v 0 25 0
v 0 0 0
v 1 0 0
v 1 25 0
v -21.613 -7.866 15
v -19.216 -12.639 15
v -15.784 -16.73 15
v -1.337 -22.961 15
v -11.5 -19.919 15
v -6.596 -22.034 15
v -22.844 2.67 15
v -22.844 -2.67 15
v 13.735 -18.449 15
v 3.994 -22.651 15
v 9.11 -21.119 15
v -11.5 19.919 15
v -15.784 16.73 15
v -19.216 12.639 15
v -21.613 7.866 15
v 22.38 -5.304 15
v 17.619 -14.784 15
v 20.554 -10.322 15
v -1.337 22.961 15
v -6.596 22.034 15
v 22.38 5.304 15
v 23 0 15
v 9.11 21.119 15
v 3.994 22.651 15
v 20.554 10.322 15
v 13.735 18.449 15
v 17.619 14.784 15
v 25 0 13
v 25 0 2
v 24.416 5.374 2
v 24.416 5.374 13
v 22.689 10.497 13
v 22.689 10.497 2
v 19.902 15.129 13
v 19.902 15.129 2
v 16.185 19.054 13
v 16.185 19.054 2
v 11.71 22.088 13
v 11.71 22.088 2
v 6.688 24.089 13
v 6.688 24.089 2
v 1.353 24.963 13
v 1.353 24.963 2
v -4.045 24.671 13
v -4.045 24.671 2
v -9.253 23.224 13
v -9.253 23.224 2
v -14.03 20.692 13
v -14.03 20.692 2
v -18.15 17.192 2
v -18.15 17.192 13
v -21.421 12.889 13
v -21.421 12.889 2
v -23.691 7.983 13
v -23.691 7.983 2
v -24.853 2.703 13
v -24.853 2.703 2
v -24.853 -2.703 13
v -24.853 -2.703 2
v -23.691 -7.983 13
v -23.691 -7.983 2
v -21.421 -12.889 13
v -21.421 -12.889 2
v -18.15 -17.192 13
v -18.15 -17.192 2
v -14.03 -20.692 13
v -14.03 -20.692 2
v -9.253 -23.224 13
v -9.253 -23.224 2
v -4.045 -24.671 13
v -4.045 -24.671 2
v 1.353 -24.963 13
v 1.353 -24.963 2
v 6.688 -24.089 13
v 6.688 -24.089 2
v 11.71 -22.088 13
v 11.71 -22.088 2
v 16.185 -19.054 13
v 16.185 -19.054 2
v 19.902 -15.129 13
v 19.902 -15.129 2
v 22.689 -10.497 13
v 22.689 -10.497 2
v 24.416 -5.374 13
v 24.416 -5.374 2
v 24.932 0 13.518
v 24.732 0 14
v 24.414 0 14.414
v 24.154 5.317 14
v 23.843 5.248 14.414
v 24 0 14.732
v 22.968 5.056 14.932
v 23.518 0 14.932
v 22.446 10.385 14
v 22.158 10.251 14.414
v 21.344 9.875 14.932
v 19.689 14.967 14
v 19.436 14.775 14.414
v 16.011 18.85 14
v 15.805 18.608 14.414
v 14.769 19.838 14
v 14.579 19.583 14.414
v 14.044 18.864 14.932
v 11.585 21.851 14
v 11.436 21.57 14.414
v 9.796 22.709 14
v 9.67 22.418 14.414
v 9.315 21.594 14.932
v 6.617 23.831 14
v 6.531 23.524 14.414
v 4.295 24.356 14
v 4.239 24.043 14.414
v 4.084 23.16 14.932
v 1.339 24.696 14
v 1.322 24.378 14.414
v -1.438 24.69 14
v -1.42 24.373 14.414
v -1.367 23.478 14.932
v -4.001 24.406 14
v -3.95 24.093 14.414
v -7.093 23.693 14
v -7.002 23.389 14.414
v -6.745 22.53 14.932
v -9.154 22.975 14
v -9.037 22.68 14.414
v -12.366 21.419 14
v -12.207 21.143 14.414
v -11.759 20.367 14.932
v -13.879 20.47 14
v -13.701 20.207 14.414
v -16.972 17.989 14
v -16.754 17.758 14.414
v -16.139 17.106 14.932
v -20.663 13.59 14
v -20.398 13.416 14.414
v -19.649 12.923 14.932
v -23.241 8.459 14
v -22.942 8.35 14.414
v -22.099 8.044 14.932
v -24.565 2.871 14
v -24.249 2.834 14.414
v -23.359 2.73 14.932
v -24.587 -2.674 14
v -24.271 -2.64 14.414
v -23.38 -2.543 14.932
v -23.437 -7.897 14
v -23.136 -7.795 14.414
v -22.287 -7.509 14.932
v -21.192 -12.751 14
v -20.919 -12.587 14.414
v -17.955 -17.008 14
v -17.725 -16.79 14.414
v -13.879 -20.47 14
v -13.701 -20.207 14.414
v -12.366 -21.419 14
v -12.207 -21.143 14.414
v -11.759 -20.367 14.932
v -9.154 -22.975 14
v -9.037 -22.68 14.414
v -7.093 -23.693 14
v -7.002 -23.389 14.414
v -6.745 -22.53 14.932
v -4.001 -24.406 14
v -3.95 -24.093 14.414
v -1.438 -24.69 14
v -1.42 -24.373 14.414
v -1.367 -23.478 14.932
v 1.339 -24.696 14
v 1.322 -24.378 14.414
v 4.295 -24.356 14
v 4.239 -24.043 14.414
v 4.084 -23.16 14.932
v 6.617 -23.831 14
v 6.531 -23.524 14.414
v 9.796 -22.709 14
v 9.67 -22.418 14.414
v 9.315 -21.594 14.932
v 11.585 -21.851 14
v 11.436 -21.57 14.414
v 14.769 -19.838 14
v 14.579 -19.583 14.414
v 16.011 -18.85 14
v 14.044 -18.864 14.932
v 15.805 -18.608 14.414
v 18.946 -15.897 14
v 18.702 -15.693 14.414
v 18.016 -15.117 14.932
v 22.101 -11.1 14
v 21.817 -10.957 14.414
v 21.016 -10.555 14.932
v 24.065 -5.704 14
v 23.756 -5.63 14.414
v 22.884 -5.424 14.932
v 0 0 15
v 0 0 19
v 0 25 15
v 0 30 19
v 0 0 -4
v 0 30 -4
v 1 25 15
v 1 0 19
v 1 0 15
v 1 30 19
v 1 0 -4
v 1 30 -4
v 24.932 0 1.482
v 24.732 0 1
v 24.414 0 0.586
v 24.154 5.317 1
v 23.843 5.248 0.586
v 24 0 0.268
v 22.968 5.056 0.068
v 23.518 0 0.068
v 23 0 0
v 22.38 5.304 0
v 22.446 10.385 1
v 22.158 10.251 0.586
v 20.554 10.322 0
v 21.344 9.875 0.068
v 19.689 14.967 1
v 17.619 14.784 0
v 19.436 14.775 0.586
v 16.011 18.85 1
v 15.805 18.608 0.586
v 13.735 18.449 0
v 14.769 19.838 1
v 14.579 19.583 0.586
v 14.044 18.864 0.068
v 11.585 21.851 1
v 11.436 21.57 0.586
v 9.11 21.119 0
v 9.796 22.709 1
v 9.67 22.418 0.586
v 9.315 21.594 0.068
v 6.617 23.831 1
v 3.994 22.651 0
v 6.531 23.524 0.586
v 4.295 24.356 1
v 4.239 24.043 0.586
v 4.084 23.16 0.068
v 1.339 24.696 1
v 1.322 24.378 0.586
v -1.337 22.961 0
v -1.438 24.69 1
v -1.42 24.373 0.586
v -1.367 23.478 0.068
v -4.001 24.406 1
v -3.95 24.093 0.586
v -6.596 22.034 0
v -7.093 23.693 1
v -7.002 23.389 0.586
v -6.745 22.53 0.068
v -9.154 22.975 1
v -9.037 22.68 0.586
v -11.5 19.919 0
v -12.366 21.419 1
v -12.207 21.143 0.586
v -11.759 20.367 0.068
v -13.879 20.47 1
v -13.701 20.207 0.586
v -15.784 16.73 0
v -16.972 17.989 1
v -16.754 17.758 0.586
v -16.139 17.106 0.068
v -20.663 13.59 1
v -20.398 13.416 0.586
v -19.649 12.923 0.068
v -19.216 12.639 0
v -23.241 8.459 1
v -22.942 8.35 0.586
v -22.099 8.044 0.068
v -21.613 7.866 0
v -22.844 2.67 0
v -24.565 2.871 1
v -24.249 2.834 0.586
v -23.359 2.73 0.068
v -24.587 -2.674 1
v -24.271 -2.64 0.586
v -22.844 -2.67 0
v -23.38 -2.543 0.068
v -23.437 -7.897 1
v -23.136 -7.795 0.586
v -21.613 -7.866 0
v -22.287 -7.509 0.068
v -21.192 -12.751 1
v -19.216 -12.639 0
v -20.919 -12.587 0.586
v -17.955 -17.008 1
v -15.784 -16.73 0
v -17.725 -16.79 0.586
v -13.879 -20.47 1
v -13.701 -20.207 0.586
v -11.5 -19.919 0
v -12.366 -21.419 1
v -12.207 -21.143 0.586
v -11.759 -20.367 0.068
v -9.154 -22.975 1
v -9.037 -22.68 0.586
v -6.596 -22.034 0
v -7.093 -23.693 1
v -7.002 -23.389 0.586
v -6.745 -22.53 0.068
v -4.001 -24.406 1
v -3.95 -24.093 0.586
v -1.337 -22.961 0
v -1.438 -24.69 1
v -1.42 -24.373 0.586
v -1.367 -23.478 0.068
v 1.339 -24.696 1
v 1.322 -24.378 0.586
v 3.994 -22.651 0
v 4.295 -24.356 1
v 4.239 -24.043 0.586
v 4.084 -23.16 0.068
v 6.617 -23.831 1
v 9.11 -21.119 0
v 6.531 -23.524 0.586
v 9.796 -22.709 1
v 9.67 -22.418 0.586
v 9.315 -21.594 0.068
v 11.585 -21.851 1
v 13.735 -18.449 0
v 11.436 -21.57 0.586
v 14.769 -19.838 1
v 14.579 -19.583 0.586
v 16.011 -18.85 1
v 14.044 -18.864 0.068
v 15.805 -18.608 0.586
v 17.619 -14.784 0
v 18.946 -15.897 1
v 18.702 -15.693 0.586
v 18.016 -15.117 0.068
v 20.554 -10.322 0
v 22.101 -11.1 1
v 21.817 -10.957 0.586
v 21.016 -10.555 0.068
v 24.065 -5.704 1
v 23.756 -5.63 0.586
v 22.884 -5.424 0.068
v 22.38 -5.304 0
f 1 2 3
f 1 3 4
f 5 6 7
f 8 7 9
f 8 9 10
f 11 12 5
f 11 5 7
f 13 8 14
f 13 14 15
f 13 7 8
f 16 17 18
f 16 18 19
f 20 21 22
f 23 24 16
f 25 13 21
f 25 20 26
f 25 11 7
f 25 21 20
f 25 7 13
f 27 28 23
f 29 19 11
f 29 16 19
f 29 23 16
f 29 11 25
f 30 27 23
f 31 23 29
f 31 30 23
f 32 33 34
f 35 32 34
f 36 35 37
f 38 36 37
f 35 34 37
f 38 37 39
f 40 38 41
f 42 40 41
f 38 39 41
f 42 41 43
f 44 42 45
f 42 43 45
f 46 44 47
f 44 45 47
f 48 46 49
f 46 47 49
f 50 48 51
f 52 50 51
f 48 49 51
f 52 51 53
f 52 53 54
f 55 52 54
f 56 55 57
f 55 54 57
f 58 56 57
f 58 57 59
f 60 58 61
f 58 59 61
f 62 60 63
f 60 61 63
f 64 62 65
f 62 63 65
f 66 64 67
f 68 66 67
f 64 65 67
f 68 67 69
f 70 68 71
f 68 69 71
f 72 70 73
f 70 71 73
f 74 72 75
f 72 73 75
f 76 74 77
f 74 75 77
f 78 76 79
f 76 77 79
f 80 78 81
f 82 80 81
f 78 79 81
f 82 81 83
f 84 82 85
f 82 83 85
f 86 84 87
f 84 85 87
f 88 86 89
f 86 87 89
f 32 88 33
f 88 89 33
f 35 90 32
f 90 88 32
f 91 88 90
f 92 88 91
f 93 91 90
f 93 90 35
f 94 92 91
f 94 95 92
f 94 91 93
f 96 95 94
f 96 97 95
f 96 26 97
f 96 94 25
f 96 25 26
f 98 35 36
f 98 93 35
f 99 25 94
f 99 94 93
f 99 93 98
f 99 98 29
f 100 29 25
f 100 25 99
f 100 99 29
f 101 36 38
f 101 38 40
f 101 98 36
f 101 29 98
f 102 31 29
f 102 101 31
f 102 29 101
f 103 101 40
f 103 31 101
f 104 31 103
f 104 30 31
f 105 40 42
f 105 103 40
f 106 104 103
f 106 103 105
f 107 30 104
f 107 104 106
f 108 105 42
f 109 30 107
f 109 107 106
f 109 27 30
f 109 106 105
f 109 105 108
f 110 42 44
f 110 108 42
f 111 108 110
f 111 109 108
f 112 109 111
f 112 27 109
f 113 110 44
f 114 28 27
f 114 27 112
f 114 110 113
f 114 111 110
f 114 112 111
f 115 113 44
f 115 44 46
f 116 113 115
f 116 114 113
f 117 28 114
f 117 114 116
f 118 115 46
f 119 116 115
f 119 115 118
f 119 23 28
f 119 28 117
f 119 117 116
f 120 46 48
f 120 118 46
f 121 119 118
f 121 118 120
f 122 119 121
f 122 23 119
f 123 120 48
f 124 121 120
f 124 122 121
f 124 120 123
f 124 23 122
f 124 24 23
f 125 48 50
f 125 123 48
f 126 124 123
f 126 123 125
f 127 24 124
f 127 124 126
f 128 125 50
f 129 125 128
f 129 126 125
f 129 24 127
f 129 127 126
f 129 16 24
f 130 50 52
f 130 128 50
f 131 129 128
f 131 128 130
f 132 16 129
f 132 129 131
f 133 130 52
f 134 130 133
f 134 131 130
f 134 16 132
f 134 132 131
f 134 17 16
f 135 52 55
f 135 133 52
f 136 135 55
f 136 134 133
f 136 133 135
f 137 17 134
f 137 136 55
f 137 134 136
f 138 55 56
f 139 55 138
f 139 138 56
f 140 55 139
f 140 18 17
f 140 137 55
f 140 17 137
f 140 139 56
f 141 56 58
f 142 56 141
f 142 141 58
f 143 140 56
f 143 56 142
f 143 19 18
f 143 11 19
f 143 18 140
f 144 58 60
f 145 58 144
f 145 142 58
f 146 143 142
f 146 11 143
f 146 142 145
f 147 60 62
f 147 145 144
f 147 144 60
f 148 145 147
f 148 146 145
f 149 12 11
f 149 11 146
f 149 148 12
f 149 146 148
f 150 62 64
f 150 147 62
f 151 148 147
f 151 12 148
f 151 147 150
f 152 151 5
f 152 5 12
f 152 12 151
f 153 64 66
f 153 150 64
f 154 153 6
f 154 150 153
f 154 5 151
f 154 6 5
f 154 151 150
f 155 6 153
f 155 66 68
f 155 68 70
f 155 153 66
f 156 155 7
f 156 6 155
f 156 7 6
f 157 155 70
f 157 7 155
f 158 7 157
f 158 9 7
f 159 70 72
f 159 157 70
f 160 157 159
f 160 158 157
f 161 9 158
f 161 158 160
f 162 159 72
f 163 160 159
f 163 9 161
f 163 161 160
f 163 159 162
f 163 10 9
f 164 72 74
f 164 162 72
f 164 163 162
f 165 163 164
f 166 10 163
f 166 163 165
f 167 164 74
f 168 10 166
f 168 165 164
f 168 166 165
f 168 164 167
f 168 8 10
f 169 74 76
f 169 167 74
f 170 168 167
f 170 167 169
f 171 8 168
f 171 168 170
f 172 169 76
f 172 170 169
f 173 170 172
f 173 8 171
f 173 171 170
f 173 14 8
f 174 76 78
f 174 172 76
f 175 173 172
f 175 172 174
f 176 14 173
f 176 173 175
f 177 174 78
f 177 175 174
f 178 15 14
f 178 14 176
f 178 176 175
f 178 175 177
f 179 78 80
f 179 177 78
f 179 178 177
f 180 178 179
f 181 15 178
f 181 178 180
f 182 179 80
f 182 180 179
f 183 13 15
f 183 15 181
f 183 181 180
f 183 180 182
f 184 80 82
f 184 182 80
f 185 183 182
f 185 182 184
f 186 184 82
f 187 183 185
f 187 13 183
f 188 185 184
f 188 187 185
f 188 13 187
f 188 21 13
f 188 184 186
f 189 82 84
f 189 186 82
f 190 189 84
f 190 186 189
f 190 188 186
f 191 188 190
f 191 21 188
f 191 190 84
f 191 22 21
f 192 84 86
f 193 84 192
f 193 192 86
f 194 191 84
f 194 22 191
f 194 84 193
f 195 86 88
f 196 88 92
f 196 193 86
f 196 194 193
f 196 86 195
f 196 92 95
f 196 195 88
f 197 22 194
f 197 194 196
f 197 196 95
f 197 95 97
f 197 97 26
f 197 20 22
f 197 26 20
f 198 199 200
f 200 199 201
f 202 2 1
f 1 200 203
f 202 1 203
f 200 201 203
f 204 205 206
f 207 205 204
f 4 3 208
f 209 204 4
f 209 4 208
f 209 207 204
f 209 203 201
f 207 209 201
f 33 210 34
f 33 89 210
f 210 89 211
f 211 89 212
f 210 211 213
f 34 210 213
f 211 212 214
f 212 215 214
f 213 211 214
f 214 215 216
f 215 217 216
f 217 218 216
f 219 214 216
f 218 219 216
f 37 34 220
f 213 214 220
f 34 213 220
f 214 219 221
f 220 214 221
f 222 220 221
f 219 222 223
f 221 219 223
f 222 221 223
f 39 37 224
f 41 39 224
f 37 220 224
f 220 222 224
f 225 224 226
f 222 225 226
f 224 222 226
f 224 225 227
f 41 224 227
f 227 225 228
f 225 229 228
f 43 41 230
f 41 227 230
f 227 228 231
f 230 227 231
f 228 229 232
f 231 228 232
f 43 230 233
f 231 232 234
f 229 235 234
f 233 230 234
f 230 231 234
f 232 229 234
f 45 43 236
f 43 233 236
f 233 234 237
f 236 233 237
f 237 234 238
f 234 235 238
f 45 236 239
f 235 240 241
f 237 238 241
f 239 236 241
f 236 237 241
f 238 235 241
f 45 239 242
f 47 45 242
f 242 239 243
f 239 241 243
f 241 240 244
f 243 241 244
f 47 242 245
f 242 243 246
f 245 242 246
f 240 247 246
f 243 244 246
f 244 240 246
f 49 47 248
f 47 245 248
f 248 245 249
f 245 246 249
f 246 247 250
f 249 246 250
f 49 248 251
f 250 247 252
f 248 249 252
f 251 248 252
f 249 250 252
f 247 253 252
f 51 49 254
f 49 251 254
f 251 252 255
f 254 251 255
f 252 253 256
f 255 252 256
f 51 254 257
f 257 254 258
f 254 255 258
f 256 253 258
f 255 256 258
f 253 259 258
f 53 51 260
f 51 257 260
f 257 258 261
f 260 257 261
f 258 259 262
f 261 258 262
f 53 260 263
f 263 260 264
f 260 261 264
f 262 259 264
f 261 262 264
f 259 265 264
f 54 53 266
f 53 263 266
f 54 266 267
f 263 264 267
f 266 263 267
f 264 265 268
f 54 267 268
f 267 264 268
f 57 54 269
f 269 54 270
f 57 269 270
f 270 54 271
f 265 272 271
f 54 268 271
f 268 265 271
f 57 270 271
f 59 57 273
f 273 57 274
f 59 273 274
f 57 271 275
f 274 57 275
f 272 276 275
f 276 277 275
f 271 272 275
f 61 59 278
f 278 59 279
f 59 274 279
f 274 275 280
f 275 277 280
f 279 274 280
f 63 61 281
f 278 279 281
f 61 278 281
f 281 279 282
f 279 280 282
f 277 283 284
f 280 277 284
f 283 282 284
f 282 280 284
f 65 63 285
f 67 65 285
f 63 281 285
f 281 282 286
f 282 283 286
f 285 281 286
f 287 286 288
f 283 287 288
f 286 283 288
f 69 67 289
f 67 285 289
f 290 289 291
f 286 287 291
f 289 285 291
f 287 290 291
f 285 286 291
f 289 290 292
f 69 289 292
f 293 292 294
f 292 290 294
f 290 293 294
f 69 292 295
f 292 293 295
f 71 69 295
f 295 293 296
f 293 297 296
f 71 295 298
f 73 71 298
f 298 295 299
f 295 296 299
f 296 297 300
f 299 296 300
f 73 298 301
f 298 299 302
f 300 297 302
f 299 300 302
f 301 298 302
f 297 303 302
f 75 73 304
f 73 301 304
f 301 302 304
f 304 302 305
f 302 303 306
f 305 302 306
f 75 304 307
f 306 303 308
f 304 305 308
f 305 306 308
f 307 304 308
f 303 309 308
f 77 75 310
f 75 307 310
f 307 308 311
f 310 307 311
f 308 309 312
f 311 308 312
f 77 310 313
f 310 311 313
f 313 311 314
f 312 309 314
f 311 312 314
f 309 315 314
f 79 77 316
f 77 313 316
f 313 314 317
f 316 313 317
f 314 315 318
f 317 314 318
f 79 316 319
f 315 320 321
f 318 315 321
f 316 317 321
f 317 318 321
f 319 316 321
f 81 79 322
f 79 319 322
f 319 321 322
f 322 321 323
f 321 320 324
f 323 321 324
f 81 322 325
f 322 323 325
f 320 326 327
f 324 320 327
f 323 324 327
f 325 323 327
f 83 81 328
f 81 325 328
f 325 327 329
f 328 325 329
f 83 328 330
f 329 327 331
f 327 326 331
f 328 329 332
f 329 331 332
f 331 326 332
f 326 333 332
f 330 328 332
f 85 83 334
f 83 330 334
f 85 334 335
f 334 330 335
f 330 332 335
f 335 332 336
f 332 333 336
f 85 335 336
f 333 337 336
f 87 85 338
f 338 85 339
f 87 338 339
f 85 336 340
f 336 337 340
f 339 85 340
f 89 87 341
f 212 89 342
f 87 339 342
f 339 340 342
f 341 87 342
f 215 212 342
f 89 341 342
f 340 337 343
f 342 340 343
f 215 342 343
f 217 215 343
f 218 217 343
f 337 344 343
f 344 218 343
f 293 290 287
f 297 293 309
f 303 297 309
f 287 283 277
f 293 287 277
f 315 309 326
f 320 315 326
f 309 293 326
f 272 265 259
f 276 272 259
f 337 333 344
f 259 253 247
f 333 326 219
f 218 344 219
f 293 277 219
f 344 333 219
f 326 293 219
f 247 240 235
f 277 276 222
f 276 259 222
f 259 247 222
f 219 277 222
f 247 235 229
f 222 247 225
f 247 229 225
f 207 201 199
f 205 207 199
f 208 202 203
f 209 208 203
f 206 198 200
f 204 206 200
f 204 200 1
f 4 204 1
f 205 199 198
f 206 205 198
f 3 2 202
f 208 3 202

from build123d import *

# Parameters (mm, degrees)
SKETCH1_R           = 25
BOSS_EXTRUDE1_DEPTH = 15
SKETCH2_W           = 15
SKETCH2_H           = 5
SKETCH2_W_2         = 4
SKETCH2_H_2         = 30
BOSS_EXTRUDE3_DEPTH = 1
FILLET1_R           = 2


with BuildPart() as part:
    # Sketch1 → Boss-Extrude1 (new body)
    with BuildSketch(Plane.XY):
        Circle(SKETCH1_R)
    extrude(amount=BOSS_EXTRUDE1_DEPTH)

    # Fillet1
    fillet1_edges = [part.edges().sort_by_distance(p)[0] for p in [
        (-25, 0, 0),
        (-25, 0, 15),
    ]]
    fillet(fillet1_edges, radius=FILLET1_R)


with BuildPart() as body_2:
    # Sketch2 → Boss-Extrude3 (new body)
    with BuildSketch(Plane(origin=(0, 0, 0), x_dir=(0, 0, -1), z_dir=(1, 0, 0))):
        Polygon((-15, 0), (-15, 25), (-15, 30), (-19, 30), (-19, 0), align=None)
        with Locations((-7.5, 27.5)):
            Rectangle(SKETCH2_W, SKETCH2_H)
        with Locations((2, 15)):
            Rectangle(SKETCH2_W_2, SKETCH2_H_2)
    extrude(amount=BOSS_EXTRUDE3_DEPTH)


solid = Compound([part.part, body_2.part])
